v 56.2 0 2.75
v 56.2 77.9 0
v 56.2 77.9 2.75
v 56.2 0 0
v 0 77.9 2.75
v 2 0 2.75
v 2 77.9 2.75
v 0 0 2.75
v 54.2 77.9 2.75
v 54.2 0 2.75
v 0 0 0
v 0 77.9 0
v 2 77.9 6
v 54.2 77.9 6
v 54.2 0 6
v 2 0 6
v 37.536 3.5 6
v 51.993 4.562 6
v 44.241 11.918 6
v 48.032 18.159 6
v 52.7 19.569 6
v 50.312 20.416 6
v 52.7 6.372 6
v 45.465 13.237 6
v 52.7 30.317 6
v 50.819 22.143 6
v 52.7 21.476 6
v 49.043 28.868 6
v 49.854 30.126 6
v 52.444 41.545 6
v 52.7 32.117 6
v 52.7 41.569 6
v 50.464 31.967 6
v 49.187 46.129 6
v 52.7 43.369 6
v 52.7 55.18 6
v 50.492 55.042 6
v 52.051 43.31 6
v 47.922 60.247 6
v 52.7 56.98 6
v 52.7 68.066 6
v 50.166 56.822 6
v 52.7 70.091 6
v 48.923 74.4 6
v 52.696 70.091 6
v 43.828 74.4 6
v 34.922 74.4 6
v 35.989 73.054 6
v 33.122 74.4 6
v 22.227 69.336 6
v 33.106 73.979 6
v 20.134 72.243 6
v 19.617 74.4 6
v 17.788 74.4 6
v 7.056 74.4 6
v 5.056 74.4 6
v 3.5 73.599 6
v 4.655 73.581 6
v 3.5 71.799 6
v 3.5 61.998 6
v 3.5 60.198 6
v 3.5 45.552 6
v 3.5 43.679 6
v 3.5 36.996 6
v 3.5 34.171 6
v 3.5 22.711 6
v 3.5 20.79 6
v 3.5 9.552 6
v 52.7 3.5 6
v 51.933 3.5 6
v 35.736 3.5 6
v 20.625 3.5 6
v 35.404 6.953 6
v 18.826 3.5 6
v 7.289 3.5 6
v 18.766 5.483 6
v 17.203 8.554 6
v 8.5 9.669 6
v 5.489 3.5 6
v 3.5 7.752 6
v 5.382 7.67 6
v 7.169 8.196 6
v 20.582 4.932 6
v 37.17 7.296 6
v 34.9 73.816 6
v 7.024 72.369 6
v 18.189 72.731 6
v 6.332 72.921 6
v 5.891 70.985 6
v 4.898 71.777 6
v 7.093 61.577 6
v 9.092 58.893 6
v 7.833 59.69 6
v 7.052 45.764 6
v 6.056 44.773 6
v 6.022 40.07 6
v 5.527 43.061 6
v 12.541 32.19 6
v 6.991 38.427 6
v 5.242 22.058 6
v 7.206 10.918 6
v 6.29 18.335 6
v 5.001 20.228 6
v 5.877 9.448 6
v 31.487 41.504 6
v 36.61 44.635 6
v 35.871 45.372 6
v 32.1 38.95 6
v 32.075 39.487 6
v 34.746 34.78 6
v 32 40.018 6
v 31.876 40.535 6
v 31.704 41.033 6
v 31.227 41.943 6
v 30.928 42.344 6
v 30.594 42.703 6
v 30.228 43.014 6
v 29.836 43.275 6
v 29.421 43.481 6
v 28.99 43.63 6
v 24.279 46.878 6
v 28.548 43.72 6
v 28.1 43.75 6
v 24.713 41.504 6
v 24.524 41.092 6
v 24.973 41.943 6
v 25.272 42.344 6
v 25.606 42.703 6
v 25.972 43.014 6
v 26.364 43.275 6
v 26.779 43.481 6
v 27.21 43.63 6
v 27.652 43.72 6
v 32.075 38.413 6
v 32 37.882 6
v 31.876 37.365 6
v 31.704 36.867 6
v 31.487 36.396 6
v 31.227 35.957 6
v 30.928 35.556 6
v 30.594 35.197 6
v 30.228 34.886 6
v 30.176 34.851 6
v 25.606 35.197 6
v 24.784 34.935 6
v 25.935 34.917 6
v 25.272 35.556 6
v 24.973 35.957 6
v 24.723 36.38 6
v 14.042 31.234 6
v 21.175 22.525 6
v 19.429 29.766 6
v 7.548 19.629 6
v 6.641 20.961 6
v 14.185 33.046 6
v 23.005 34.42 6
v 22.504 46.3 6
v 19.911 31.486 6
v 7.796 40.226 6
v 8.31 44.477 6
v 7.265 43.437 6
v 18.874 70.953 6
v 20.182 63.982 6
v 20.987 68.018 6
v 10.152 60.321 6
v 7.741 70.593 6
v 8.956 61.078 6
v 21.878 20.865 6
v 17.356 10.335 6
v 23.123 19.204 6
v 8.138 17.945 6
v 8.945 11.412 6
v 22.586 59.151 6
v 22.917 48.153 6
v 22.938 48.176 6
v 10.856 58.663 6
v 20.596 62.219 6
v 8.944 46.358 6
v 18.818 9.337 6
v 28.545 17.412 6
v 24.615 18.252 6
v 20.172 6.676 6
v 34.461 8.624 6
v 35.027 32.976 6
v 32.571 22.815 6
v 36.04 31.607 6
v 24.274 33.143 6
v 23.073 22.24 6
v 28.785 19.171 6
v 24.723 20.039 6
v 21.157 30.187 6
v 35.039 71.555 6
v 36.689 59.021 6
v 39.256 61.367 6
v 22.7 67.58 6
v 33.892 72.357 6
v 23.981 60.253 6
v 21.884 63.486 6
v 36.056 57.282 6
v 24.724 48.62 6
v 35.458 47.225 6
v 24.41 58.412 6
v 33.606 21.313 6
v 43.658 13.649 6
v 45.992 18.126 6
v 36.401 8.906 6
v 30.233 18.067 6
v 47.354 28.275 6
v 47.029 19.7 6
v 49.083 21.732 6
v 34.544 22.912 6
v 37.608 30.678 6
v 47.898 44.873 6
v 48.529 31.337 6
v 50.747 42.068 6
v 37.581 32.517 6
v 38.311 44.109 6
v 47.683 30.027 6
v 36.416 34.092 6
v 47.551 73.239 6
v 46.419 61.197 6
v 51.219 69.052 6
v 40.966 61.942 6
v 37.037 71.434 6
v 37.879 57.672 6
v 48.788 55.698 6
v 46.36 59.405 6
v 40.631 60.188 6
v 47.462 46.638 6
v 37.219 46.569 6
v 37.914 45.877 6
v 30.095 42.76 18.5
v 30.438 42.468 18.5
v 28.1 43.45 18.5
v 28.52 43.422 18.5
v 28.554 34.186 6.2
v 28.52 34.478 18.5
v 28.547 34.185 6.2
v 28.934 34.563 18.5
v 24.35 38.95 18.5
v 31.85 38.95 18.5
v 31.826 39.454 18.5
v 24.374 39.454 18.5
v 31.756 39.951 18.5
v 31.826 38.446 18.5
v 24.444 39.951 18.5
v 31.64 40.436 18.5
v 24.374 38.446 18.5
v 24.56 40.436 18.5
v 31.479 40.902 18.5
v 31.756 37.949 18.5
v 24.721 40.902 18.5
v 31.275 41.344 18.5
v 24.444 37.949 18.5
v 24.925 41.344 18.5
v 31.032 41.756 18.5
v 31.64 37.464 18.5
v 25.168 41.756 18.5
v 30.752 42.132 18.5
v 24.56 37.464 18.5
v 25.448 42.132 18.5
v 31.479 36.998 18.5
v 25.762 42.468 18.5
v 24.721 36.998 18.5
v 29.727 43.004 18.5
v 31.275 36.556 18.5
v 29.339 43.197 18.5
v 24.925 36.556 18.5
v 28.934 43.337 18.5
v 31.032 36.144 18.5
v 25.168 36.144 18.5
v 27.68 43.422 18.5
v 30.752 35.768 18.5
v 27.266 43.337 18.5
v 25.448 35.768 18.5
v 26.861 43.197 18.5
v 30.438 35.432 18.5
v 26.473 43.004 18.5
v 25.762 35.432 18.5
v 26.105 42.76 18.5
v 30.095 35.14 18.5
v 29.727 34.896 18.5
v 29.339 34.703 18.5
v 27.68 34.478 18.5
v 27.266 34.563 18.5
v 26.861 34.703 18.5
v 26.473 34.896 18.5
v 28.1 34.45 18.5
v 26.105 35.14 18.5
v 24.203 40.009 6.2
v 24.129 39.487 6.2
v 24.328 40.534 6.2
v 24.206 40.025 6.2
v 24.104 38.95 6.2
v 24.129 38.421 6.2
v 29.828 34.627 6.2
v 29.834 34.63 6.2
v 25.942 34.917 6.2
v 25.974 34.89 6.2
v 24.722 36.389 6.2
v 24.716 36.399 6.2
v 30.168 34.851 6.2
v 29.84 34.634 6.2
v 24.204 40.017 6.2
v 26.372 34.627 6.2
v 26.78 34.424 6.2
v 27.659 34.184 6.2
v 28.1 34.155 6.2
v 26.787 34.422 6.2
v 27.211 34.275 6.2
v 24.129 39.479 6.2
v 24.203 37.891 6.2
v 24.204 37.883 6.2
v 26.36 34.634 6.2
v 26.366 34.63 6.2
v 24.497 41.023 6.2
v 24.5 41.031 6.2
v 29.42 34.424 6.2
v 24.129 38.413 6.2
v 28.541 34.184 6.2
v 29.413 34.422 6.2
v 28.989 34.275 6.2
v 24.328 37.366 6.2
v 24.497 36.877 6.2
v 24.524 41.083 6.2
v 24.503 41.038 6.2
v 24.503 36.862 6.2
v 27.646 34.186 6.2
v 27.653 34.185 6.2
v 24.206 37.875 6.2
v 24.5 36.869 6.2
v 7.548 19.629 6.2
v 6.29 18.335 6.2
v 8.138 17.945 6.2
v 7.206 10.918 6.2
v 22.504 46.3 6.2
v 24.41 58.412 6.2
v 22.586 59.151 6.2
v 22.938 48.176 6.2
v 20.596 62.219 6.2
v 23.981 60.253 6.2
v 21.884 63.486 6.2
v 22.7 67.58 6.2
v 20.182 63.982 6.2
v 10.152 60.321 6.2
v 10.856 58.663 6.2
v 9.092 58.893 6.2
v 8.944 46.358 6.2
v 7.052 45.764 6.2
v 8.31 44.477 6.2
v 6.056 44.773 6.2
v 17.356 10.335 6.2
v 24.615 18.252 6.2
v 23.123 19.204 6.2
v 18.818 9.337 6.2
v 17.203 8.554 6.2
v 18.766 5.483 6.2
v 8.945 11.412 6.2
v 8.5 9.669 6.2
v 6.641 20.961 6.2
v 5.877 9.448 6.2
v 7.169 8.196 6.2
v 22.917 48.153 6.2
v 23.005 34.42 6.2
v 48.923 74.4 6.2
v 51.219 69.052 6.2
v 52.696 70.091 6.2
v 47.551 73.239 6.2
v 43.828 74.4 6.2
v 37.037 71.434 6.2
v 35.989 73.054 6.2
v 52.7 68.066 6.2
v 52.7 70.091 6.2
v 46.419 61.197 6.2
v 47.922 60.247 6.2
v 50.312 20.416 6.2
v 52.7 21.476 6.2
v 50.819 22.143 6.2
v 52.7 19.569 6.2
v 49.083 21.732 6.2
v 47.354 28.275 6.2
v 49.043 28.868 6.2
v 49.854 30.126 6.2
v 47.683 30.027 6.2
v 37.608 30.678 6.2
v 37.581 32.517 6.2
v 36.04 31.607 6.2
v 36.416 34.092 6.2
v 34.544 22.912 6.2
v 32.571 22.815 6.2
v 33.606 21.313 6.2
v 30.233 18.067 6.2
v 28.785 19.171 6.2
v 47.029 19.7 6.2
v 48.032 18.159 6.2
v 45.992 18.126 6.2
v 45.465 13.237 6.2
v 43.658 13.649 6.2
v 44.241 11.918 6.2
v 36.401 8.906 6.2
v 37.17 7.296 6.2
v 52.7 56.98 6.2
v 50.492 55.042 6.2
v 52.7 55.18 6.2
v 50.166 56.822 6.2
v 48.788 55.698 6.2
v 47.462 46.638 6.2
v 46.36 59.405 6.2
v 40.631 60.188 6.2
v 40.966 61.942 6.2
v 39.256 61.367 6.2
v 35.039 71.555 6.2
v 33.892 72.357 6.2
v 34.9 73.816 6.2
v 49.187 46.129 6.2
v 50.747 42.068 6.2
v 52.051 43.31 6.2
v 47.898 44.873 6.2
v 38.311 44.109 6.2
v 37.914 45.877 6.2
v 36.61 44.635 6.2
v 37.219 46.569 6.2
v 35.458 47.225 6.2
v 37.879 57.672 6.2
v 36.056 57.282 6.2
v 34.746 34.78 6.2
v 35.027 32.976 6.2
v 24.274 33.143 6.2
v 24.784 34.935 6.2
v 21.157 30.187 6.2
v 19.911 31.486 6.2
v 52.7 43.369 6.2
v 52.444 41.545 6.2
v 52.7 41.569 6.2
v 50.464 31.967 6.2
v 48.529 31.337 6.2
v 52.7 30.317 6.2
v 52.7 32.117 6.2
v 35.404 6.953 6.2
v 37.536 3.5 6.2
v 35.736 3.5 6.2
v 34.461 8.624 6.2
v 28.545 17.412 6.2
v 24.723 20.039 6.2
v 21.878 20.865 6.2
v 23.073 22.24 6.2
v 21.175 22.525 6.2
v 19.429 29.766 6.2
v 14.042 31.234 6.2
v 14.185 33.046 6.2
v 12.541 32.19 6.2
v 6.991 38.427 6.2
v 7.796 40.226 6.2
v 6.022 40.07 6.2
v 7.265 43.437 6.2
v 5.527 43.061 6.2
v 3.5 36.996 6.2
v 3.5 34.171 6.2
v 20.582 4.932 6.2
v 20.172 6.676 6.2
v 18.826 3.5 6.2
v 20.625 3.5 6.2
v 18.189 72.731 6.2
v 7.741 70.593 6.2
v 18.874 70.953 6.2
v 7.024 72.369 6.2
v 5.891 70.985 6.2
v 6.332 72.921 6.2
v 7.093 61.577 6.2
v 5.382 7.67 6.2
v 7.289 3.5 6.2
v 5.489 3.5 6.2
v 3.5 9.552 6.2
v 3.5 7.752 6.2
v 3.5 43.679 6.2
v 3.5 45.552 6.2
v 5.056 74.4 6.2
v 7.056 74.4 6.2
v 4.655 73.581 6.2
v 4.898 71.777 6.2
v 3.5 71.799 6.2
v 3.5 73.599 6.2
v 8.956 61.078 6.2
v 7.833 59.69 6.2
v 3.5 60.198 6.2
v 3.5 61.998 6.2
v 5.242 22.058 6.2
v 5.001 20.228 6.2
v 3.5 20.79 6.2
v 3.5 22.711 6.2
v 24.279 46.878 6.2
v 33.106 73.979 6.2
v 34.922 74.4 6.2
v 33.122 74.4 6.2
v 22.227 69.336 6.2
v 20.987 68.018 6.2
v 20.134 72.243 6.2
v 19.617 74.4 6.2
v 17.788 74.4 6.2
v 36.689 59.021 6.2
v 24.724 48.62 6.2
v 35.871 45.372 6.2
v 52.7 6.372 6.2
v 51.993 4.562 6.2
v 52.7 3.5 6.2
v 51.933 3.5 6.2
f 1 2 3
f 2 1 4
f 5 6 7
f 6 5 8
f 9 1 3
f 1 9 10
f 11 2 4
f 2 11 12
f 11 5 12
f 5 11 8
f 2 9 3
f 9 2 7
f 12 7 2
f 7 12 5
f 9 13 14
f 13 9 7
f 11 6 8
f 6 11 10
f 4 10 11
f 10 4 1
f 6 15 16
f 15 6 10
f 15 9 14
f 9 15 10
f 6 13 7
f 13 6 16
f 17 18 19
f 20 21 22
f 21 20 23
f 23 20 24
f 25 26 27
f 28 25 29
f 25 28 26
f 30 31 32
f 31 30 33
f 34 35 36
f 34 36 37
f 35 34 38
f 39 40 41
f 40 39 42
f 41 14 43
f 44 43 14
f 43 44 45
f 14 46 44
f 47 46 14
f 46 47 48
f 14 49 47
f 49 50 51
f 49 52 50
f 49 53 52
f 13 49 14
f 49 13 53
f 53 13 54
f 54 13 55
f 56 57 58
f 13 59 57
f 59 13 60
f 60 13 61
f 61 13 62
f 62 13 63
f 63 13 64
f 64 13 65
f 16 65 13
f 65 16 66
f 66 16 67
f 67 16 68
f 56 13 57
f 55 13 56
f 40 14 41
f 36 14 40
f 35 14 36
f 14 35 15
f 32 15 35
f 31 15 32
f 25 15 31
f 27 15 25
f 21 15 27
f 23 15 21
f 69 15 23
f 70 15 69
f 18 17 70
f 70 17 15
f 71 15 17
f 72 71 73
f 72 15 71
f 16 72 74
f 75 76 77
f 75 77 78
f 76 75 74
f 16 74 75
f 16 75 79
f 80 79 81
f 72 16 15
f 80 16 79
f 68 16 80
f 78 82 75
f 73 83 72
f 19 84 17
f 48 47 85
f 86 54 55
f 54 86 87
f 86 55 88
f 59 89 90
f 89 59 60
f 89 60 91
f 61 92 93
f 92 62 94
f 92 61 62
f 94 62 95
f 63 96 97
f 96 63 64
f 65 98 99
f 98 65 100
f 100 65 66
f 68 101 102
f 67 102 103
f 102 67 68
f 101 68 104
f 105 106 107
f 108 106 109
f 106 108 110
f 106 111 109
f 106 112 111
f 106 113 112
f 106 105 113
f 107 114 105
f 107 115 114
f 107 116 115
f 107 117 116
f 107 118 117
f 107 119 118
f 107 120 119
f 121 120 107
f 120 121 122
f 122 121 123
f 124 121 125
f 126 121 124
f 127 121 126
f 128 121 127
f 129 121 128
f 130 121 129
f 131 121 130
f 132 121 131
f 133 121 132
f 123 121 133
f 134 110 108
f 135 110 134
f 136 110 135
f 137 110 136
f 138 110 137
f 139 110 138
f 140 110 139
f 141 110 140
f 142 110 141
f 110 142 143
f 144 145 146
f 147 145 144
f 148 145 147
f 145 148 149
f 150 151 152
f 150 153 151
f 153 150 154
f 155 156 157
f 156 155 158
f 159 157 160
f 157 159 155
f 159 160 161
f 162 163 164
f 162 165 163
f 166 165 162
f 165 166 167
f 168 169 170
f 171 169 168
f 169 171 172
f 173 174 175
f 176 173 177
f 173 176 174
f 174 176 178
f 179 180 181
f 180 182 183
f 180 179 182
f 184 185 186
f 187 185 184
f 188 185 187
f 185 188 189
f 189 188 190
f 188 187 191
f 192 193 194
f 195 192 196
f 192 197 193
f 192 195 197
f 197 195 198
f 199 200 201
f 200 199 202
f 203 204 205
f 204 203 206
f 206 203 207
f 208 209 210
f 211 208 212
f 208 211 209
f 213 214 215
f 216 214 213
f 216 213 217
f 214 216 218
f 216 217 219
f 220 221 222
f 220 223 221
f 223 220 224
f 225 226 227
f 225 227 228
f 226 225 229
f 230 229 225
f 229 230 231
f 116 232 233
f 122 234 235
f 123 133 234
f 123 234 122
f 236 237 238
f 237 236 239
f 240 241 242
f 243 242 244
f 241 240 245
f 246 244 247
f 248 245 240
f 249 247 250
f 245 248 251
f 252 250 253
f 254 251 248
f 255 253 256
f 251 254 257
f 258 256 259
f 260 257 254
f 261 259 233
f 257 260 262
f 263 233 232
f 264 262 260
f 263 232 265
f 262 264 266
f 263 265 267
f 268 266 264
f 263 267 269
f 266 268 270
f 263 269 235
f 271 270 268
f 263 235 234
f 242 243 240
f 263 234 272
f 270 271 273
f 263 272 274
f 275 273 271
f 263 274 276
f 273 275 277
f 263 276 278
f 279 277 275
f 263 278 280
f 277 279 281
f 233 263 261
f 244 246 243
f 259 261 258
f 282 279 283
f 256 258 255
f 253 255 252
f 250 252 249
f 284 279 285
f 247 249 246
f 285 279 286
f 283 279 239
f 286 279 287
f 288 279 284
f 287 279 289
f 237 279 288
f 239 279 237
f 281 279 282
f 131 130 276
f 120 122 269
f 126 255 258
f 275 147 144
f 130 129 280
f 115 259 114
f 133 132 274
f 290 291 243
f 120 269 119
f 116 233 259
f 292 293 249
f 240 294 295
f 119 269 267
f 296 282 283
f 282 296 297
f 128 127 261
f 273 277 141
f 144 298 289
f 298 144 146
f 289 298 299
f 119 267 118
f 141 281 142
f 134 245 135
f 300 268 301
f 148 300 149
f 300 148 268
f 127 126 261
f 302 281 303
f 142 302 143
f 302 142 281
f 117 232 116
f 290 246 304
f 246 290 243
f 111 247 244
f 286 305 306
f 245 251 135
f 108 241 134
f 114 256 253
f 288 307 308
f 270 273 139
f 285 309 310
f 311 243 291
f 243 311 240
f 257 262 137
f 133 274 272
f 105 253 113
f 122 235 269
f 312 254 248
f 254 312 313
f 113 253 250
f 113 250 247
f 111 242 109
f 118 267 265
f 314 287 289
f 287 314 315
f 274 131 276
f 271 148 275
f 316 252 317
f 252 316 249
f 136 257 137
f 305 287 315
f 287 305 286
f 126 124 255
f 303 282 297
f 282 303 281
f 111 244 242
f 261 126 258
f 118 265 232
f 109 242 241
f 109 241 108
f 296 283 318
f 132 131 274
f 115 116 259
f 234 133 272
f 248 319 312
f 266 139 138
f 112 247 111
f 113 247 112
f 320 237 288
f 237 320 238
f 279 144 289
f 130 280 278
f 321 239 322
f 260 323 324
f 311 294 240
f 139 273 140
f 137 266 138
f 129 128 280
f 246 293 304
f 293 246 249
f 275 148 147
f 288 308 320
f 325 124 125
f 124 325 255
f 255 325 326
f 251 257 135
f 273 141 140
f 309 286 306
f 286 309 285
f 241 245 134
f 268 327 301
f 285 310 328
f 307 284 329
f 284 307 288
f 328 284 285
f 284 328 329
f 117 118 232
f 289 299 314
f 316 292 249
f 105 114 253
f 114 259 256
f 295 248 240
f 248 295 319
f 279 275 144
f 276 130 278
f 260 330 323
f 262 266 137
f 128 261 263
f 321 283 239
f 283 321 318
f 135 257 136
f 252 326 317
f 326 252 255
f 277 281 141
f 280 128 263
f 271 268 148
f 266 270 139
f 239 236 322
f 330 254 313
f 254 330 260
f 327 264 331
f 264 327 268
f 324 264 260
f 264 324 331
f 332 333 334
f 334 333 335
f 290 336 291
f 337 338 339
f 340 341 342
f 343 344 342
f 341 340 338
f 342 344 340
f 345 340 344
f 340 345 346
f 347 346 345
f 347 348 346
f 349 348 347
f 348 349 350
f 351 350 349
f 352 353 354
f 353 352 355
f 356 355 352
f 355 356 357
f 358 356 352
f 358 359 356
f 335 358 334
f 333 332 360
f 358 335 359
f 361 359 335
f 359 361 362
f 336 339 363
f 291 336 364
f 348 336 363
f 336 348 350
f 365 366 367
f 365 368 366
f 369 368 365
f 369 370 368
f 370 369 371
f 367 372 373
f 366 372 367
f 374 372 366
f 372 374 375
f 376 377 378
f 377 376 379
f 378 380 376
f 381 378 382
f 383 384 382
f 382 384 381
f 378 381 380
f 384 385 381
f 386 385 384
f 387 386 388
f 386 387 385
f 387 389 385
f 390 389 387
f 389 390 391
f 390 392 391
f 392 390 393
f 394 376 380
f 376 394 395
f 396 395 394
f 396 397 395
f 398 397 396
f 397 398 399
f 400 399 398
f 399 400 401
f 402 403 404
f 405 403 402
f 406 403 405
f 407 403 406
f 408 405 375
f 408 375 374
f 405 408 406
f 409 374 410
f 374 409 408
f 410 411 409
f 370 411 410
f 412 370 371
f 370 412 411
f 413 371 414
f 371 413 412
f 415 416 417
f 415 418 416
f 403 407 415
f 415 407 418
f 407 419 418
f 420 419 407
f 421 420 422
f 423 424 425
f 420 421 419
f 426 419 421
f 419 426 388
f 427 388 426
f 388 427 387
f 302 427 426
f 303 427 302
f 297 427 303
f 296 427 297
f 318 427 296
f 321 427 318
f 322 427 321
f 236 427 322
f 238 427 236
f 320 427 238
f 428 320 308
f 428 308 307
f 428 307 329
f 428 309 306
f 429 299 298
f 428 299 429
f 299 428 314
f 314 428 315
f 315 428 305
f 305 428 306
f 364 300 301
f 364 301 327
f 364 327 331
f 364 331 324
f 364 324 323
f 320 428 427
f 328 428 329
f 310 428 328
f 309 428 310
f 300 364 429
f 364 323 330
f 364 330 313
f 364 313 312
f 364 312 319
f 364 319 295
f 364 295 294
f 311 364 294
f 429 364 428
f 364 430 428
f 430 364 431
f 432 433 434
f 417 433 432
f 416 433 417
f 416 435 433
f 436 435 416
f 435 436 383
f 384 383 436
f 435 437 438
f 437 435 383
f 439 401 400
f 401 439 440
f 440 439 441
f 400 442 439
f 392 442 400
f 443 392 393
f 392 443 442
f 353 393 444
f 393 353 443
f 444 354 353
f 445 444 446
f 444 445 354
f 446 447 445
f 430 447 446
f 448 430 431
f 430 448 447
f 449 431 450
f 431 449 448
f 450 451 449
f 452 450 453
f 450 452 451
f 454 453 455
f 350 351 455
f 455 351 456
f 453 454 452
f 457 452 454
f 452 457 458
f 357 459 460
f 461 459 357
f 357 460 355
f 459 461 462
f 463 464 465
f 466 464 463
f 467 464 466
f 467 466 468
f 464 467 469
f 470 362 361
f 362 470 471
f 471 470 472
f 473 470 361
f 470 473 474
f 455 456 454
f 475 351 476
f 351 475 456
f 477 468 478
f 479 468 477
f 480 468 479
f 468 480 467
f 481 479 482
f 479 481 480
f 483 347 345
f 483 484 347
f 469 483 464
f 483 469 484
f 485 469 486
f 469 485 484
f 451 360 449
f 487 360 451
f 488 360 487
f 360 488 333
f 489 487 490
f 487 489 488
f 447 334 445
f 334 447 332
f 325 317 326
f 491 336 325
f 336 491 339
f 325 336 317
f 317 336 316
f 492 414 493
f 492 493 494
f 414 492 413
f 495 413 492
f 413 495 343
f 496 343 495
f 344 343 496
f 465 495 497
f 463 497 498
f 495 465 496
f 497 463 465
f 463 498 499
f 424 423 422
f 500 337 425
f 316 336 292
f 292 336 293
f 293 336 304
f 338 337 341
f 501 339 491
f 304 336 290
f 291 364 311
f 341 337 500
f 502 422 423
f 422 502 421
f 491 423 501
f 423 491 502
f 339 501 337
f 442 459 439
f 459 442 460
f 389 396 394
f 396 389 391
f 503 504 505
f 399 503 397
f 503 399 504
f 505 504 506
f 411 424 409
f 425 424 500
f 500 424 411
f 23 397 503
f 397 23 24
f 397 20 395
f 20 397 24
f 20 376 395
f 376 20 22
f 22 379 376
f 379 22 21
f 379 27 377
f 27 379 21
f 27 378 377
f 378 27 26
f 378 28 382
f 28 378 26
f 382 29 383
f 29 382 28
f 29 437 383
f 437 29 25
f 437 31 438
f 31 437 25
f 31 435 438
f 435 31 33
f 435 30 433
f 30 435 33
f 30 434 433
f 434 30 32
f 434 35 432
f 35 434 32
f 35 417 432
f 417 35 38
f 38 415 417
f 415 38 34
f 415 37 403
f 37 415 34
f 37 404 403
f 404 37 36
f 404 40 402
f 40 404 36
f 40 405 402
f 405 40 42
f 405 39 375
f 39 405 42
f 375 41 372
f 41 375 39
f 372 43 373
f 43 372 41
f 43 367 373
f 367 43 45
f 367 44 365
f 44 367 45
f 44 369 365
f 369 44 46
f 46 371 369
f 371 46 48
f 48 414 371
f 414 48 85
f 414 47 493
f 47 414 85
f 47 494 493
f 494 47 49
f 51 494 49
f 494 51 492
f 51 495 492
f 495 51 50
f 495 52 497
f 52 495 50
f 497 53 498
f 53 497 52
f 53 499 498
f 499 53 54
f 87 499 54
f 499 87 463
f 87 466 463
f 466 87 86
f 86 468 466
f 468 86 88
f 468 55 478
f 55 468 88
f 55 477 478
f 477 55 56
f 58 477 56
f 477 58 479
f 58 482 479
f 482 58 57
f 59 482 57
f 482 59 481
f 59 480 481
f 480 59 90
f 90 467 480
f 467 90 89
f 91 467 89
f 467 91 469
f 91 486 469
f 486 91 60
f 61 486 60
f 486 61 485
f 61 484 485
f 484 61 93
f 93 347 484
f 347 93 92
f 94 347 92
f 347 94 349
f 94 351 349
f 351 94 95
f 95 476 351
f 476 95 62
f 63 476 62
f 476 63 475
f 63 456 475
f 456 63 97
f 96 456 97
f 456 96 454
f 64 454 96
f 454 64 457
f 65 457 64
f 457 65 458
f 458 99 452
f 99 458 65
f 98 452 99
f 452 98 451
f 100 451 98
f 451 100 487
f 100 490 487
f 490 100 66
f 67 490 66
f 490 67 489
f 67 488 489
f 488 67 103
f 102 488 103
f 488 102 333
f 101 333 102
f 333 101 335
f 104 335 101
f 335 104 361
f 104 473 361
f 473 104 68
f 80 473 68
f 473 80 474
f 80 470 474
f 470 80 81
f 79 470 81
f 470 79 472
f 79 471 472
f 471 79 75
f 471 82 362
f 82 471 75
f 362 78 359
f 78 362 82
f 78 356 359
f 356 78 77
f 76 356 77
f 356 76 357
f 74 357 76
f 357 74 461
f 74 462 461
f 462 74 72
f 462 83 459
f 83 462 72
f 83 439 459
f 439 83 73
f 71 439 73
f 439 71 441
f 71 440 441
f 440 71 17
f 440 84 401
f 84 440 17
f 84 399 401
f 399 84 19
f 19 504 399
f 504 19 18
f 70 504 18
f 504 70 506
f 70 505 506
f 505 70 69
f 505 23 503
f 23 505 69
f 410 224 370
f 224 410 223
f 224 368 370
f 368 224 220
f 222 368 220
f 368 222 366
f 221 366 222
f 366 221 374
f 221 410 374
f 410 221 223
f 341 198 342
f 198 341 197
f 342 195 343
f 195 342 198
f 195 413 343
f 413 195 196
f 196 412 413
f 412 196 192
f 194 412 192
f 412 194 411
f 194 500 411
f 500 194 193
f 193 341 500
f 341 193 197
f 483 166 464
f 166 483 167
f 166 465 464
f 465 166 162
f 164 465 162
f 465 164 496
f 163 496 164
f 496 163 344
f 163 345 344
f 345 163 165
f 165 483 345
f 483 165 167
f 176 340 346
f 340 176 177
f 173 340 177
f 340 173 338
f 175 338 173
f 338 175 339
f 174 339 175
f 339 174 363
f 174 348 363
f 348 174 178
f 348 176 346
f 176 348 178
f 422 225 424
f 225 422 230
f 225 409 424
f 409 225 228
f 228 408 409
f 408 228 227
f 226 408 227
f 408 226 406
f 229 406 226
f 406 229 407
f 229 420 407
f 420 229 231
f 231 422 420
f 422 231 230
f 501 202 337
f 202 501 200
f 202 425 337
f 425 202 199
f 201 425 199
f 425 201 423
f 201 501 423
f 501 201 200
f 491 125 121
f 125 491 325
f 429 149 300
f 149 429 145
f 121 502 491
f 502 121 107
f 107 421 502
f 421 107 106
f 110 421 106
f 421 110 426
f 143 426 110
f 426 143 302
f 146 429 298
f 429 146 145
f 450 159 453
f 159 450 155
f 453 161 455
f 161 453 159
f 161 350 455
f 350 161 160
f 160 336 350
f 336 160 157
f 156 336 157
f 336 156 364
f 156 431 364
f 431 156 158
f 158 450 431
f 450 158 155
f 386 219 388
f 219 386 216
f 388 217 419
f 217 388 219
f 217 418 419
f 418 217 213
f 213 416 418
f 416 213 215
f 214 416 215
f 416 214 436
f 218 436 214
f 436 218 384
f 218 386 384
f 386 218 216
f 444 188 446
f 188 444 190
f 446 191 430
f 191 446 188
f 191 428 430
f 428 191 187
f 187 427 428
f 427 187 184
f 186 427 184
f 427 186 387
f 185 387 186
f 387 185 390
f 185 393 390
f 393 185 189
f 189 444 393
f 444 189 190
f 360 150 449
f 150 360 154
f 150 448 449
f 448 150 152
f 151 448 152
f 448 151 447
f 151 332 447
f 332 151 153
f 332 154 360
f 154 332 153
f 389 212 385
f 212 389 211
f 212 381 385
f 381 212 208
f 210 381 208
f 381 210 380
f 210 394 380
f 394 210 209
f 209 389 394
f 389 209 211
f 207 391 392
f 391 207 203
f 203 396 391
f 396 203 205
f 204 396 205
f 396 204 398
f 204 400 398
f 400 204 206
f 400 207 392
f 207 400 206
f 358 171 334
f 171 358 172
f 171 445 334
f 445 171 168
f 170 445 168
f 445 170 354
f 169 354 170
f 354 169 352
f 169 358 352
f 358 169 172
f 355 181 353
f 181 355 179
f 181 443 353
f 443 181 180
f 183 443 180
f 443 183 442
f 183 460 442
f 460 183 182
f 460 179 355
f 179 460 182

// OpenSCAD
// file: voronoi.scad
// =====================================================================
//  voronoi.scad  -  Voronoi-Netz (2D) + Relief-Platzierung auf Flächen
// =====================================================================

// 2D-Netz: jedes Segment wird zu einer "Kapsel" (hull zweier Kreise).
module voro_web_2d(segs, strut) {
    r = strut / 2;
    union()
        for (s = segs)
            hull() {
                translate([s[0], s[1]]) circle(r = r, $fn = 16);
                translate([s[2], s[3]]) circle(r = r, $fn = 16);
            }
}

// Relief-Scheibe: Netz auf Rechteck w x h geclippt, Dicke "thick" in +Z.
// Taucht "ov" mm in den Körper ein (-Z), damit es sicher verschmilzt.
module voro_slab(w, h, segs, strut, thick, ov = 0.8) {
    translate([0, 0, -ov])
        linear_extrude(height = thick + ov)
            intersection() {
                square([w, h]);
                voro_web_2d(segs, strut);
            }
}

// --- Platzierung auf den 4 Außenflächen eines Korpus (x:0..W, y:0..D, z:0..H)
//     Relief ragt nach außen (erhaben), um Rand-Margin m eingerückt
//     (sitzt so auf den flachen Bändern, nicht in den abgerundeten Kanten).
//     segs sind bereits für (Seite-2m) x (H-2m) erzeugt.
module relief_front(W, H, segs, strut, thick, m)           // -Y bei y=0
    translate([m, 0, m]) rotate([90, 0, 0])
        voro_slab(W - 2*m, H - 2*m, segs, strut, thick);

module relief_back(W, D, H, segs, strut, thick, m)         // +Y bei y=D
    translate([W - m, D, m]) rotate([90, 0, 180])
        voro_slab(W - 2*m, H - 2*m, segs, strut, thick);

module relief_left(D, H, segs, strut, thick, m)            // -X bei x=0
    translate([0, D - m, m]) rotate([90, 0, -90])
        voro_slab(D - 2*m, H - 2*m, segs, strut, thick);

module relief_right(W, D, H, segs, strut, thick, m)        // +X bei x=W
    translate([W, m, m]) rotate([90, 0, 90])
        voro_slab(D - 2*m, H - 2*m, segs, strut, thick);
// main file
// =====================================================================
//  grid.scad  -  Einsteckgitter im Voronoi-Stil (ein Fach)
//  Aufruf:  openscad -D bay_index=0 -o grid0.stl grid.scad
//  stand : Voronoi-Panel + zentraler Zapfen (Bürste aufstecken)
//          orb Ø10 x 14 | son Ø5,5 x 8,5
//  charge: Voronoi-Panel + Öffnung  orb: Ø42 rund | son: D-Kontur 51x63
// =====================================================================
include <params.scad>
include <voronoi_data.scad>
use <voronoi.scad>

bay_index = 0;   // per -D überschreiben

// D-Kontur der Sonicare-Ladestation: BOGEN nach VORNE (-Y), GERADE nach
// HINTEN (+Y) — passend zur realen Station (gerade Rückseite zur Rückwand).
// y=0 des Einsatzes liegt vorne (an der Frontwand), +Y zeigt nach hinten.
module dshape(w, L) {
    hull() {
        translate([0, -(L/2 - w/2)]) circle(d = w);   // Bogen vorne
        translate([-w/2, L/2 - 1]) square([w, 1]);     // gerade Seite hinten
    }
}

// 2D-Lade-Öffnung, zentriert. grow = umlaufendes Spiel.
//   Oral-B: Ellipse 42x55 | Sonicare: D-Kontur 51x63
module charge_open_2d(mk, grow = 0) {
    if (mk == "son")
        dshape(son_charger_x + 2*grow, son_charger_y + 2*grow);
    else
        resize([orb_charger_x + 2*grow, orb_charger_y + 2*grow]) circle(d = 100);
}

// Lade-Öffnung als 3D-Schnittkörper.
//   Sonicare: gerader, senkrechter Durchbruch.
//   Oral-B:   weitet sich zur UNTERSEITE hin im 45°-Winkel auf (oben snug wie
//             bisher, unten Trichter) -> Ladegerät passt von unten leichter rein.
module charge_cut(mk, grow) {
    if (mk == "orb") {
        flare = insert_h;   // 45°: horizontale Aufweitung == Höhe
        hull() {
            // oben: unveränderte (snug) Öffnung, ragt minimal über die Oberkante
            translate([0, 0, insert_h - 0.01]) linear_extrude(0.02)
                charge_open_2d(mk, grow);
            // unten: um flare aufgeweitet, ragt minimal unter die Unterkante
            translate([0, 0, -0.1]) linear_extrude(0.1)
                offset(flare) charge_open_2d(mk, grow);
        }
    } else {
        translate([0, 0, -0.1]) linear_extrude(insert_h + 0.2) charge_open_2d(mk, grow);
    }
}
// zentrierte Ellipse als 2D
module ellipse(dx, dy) { resize([dx, dy]) circle(d = max(dx, dy), $fn = 56); }

// Oral-B: ovaler, sich verjüngender Zapfen + ovaler Sockel
module peg_orb() {
    b = orb_peg_base; t = orb_peg_tip;
    ellipse_h = orb_peg_h;
    // Sockel (oval, Einsatzhöhe)
    linear_extrude(insert_h) ellipse(b[0] + 2*peg_collar, b[1] + 2*peg_collar);
    // Schaft: von b -> t verjüngt
    translate([0, 0, insert_h])
        linear_extrude(height = ellipse_h, scale = [t[0]/b[0], t[1]/b[1]])
            ellipse(b[0], b[1]);
}

// Sonicare: runder Zapfen Ø7 + runder Sockel, kleine Spitzenfase
module peg_son() {
    pd = son_peg_d; ph = son_peg_h;
    cylinder(d = pd + 2*peg_collar, h = insert_h);
    cylinder(d = pd, h = insert_h + ph - peg_chamfer);
    translate([0, 0, insert_h + ph - peg_chamfer])
        cylinder(d1 = pd, d2 = pd - 2*peg_chamfer, h = peg_chamfer);
}

// v2: GESCHLOSSENE solide Platte (das Muster kommt als dünnes Relief oben drauf).
module grid_panel(w, d)
    linear_extrude(height = insert_h) square([w, d]);

// Dünnes Voronoi-Relief auf der OBERSEITE des Einschubs (1 Lage, nur Deko).
// Rand um rail_overhang+ frei halten -> kollidiert nicht mit der Fach-Lippe.
module insert_relief(w, d) {
    m = rail_overhang + 1.5; ov = 0.4;
    translate([0, 0, insert_h - ov])
        linear_extrude(relief_insert_h + ov)
            intersection() {
                translate([m, m]) square([w - 2*m, d - 2*m]);
                voro_web_2d(voro_insert, voro_strut);
            }
}

// Einsatz-Hüllprofil (T-Querschnitt): volle Breite unten = Feder, die unter
// die Fach-Lippe greift; schmaler oben (um rail_overhang je Seite), ragt durch
// den "Mund" und schließt bündig ab. rail_clear = vertikales Spiel unter Lippe.
module insert_envelope(w, d) {
    fh = insert_h - rail_thick - rail_clear;   // volle Breite bis hier
    union() {
        cube([w, d, fh]);
        translate([rail_overhang, 0, fh])
            cube([w - 2*rail_overhang, d, insert_h - fh + 0.01]);
    }
}

// Halbrunde Kabelrinne (son_cable_w breit x son_cable_h hoch) an der GERADEN
// (hinteren, +Y) D-Kante auf der UNTERSEITE -> Sonicare-Kabel liegt sauber nach
// hinten. Wird in grid_insert relativ zum Öffnungszentrum subtrahiert.
module son_cable_notch(grow) {
    rr = son_cable_w / 2;
    zc = son_cable_h - rr;                      // Kreismitte -> Oberkante bei son_cable_h
    ys = (son_charger_y + 2*grow)/2 - 1;        // an der geraden D-Kante (leicht in die Öffnung)
    translate([0, ys, zc]) rotate([-90, 0, 0])
        cylinder(r = rr, h = 60, $fn = 32);     // Achse +Y, bis hinter den Einschubrand
}

module grid_insert(fn, mk) {
    w = bay_inner_w  - 2 * clearance;
    d = insert_depth - 2 * clearance;          // lässt hinten Platz für die Rückwand
    cx = w / 2; cy = d / 2;
    if (fn == "stand") {
        union() {
            intersection() { grid_panel(w, d); insert_envelope(w, d); }
            insert_relief(w, d);
            translate([cx, cy, 0])
                if (mk == "orb") peg_orb(); else peg_son();
        }
    } else if (fn == "tray") {  // Ablage: komplett geschlossene Platte + Relief
        union() {
            intersection() { grid_panel(w, d); insert_envelope(w, d); }
            insert_relief(w, d);
        }
    } else {  // charge: geschlossene Platte + Relief, dann Ladeöffnung ausschneiden
        grow = son_charger_fit;
        difference() {
            union() {
                intersection() { grid_panel(w, d); insert_envelope(w, d); }
                insert_relief(w, d);
            }
            translate([cx, cy, 0]) charge_cut(mk, grow);
            // Relief-Schicht ueber der Oeffnung mitraeumen (charge_cut endet snug
            // an der Plattenoberkante, das duenne Relief darueber bliebe sonst stehen)
            translate([cx, cy, insert_h - 0.05])
                linear_extrude(relief_insert_h + 0.1) charge_open_2d(mk, grow);
            // Sonicare: halbrunde Kabelrinne an der geraden D-Kante (Unterseite)
            if (mk == "son") translate([cx, cy, 0]) son_cable_notch(grow);
        }
    }
}

fn = bays[bay_index][0];
mk = bays[bay_index][1];
grid_insert(fn, mk);
